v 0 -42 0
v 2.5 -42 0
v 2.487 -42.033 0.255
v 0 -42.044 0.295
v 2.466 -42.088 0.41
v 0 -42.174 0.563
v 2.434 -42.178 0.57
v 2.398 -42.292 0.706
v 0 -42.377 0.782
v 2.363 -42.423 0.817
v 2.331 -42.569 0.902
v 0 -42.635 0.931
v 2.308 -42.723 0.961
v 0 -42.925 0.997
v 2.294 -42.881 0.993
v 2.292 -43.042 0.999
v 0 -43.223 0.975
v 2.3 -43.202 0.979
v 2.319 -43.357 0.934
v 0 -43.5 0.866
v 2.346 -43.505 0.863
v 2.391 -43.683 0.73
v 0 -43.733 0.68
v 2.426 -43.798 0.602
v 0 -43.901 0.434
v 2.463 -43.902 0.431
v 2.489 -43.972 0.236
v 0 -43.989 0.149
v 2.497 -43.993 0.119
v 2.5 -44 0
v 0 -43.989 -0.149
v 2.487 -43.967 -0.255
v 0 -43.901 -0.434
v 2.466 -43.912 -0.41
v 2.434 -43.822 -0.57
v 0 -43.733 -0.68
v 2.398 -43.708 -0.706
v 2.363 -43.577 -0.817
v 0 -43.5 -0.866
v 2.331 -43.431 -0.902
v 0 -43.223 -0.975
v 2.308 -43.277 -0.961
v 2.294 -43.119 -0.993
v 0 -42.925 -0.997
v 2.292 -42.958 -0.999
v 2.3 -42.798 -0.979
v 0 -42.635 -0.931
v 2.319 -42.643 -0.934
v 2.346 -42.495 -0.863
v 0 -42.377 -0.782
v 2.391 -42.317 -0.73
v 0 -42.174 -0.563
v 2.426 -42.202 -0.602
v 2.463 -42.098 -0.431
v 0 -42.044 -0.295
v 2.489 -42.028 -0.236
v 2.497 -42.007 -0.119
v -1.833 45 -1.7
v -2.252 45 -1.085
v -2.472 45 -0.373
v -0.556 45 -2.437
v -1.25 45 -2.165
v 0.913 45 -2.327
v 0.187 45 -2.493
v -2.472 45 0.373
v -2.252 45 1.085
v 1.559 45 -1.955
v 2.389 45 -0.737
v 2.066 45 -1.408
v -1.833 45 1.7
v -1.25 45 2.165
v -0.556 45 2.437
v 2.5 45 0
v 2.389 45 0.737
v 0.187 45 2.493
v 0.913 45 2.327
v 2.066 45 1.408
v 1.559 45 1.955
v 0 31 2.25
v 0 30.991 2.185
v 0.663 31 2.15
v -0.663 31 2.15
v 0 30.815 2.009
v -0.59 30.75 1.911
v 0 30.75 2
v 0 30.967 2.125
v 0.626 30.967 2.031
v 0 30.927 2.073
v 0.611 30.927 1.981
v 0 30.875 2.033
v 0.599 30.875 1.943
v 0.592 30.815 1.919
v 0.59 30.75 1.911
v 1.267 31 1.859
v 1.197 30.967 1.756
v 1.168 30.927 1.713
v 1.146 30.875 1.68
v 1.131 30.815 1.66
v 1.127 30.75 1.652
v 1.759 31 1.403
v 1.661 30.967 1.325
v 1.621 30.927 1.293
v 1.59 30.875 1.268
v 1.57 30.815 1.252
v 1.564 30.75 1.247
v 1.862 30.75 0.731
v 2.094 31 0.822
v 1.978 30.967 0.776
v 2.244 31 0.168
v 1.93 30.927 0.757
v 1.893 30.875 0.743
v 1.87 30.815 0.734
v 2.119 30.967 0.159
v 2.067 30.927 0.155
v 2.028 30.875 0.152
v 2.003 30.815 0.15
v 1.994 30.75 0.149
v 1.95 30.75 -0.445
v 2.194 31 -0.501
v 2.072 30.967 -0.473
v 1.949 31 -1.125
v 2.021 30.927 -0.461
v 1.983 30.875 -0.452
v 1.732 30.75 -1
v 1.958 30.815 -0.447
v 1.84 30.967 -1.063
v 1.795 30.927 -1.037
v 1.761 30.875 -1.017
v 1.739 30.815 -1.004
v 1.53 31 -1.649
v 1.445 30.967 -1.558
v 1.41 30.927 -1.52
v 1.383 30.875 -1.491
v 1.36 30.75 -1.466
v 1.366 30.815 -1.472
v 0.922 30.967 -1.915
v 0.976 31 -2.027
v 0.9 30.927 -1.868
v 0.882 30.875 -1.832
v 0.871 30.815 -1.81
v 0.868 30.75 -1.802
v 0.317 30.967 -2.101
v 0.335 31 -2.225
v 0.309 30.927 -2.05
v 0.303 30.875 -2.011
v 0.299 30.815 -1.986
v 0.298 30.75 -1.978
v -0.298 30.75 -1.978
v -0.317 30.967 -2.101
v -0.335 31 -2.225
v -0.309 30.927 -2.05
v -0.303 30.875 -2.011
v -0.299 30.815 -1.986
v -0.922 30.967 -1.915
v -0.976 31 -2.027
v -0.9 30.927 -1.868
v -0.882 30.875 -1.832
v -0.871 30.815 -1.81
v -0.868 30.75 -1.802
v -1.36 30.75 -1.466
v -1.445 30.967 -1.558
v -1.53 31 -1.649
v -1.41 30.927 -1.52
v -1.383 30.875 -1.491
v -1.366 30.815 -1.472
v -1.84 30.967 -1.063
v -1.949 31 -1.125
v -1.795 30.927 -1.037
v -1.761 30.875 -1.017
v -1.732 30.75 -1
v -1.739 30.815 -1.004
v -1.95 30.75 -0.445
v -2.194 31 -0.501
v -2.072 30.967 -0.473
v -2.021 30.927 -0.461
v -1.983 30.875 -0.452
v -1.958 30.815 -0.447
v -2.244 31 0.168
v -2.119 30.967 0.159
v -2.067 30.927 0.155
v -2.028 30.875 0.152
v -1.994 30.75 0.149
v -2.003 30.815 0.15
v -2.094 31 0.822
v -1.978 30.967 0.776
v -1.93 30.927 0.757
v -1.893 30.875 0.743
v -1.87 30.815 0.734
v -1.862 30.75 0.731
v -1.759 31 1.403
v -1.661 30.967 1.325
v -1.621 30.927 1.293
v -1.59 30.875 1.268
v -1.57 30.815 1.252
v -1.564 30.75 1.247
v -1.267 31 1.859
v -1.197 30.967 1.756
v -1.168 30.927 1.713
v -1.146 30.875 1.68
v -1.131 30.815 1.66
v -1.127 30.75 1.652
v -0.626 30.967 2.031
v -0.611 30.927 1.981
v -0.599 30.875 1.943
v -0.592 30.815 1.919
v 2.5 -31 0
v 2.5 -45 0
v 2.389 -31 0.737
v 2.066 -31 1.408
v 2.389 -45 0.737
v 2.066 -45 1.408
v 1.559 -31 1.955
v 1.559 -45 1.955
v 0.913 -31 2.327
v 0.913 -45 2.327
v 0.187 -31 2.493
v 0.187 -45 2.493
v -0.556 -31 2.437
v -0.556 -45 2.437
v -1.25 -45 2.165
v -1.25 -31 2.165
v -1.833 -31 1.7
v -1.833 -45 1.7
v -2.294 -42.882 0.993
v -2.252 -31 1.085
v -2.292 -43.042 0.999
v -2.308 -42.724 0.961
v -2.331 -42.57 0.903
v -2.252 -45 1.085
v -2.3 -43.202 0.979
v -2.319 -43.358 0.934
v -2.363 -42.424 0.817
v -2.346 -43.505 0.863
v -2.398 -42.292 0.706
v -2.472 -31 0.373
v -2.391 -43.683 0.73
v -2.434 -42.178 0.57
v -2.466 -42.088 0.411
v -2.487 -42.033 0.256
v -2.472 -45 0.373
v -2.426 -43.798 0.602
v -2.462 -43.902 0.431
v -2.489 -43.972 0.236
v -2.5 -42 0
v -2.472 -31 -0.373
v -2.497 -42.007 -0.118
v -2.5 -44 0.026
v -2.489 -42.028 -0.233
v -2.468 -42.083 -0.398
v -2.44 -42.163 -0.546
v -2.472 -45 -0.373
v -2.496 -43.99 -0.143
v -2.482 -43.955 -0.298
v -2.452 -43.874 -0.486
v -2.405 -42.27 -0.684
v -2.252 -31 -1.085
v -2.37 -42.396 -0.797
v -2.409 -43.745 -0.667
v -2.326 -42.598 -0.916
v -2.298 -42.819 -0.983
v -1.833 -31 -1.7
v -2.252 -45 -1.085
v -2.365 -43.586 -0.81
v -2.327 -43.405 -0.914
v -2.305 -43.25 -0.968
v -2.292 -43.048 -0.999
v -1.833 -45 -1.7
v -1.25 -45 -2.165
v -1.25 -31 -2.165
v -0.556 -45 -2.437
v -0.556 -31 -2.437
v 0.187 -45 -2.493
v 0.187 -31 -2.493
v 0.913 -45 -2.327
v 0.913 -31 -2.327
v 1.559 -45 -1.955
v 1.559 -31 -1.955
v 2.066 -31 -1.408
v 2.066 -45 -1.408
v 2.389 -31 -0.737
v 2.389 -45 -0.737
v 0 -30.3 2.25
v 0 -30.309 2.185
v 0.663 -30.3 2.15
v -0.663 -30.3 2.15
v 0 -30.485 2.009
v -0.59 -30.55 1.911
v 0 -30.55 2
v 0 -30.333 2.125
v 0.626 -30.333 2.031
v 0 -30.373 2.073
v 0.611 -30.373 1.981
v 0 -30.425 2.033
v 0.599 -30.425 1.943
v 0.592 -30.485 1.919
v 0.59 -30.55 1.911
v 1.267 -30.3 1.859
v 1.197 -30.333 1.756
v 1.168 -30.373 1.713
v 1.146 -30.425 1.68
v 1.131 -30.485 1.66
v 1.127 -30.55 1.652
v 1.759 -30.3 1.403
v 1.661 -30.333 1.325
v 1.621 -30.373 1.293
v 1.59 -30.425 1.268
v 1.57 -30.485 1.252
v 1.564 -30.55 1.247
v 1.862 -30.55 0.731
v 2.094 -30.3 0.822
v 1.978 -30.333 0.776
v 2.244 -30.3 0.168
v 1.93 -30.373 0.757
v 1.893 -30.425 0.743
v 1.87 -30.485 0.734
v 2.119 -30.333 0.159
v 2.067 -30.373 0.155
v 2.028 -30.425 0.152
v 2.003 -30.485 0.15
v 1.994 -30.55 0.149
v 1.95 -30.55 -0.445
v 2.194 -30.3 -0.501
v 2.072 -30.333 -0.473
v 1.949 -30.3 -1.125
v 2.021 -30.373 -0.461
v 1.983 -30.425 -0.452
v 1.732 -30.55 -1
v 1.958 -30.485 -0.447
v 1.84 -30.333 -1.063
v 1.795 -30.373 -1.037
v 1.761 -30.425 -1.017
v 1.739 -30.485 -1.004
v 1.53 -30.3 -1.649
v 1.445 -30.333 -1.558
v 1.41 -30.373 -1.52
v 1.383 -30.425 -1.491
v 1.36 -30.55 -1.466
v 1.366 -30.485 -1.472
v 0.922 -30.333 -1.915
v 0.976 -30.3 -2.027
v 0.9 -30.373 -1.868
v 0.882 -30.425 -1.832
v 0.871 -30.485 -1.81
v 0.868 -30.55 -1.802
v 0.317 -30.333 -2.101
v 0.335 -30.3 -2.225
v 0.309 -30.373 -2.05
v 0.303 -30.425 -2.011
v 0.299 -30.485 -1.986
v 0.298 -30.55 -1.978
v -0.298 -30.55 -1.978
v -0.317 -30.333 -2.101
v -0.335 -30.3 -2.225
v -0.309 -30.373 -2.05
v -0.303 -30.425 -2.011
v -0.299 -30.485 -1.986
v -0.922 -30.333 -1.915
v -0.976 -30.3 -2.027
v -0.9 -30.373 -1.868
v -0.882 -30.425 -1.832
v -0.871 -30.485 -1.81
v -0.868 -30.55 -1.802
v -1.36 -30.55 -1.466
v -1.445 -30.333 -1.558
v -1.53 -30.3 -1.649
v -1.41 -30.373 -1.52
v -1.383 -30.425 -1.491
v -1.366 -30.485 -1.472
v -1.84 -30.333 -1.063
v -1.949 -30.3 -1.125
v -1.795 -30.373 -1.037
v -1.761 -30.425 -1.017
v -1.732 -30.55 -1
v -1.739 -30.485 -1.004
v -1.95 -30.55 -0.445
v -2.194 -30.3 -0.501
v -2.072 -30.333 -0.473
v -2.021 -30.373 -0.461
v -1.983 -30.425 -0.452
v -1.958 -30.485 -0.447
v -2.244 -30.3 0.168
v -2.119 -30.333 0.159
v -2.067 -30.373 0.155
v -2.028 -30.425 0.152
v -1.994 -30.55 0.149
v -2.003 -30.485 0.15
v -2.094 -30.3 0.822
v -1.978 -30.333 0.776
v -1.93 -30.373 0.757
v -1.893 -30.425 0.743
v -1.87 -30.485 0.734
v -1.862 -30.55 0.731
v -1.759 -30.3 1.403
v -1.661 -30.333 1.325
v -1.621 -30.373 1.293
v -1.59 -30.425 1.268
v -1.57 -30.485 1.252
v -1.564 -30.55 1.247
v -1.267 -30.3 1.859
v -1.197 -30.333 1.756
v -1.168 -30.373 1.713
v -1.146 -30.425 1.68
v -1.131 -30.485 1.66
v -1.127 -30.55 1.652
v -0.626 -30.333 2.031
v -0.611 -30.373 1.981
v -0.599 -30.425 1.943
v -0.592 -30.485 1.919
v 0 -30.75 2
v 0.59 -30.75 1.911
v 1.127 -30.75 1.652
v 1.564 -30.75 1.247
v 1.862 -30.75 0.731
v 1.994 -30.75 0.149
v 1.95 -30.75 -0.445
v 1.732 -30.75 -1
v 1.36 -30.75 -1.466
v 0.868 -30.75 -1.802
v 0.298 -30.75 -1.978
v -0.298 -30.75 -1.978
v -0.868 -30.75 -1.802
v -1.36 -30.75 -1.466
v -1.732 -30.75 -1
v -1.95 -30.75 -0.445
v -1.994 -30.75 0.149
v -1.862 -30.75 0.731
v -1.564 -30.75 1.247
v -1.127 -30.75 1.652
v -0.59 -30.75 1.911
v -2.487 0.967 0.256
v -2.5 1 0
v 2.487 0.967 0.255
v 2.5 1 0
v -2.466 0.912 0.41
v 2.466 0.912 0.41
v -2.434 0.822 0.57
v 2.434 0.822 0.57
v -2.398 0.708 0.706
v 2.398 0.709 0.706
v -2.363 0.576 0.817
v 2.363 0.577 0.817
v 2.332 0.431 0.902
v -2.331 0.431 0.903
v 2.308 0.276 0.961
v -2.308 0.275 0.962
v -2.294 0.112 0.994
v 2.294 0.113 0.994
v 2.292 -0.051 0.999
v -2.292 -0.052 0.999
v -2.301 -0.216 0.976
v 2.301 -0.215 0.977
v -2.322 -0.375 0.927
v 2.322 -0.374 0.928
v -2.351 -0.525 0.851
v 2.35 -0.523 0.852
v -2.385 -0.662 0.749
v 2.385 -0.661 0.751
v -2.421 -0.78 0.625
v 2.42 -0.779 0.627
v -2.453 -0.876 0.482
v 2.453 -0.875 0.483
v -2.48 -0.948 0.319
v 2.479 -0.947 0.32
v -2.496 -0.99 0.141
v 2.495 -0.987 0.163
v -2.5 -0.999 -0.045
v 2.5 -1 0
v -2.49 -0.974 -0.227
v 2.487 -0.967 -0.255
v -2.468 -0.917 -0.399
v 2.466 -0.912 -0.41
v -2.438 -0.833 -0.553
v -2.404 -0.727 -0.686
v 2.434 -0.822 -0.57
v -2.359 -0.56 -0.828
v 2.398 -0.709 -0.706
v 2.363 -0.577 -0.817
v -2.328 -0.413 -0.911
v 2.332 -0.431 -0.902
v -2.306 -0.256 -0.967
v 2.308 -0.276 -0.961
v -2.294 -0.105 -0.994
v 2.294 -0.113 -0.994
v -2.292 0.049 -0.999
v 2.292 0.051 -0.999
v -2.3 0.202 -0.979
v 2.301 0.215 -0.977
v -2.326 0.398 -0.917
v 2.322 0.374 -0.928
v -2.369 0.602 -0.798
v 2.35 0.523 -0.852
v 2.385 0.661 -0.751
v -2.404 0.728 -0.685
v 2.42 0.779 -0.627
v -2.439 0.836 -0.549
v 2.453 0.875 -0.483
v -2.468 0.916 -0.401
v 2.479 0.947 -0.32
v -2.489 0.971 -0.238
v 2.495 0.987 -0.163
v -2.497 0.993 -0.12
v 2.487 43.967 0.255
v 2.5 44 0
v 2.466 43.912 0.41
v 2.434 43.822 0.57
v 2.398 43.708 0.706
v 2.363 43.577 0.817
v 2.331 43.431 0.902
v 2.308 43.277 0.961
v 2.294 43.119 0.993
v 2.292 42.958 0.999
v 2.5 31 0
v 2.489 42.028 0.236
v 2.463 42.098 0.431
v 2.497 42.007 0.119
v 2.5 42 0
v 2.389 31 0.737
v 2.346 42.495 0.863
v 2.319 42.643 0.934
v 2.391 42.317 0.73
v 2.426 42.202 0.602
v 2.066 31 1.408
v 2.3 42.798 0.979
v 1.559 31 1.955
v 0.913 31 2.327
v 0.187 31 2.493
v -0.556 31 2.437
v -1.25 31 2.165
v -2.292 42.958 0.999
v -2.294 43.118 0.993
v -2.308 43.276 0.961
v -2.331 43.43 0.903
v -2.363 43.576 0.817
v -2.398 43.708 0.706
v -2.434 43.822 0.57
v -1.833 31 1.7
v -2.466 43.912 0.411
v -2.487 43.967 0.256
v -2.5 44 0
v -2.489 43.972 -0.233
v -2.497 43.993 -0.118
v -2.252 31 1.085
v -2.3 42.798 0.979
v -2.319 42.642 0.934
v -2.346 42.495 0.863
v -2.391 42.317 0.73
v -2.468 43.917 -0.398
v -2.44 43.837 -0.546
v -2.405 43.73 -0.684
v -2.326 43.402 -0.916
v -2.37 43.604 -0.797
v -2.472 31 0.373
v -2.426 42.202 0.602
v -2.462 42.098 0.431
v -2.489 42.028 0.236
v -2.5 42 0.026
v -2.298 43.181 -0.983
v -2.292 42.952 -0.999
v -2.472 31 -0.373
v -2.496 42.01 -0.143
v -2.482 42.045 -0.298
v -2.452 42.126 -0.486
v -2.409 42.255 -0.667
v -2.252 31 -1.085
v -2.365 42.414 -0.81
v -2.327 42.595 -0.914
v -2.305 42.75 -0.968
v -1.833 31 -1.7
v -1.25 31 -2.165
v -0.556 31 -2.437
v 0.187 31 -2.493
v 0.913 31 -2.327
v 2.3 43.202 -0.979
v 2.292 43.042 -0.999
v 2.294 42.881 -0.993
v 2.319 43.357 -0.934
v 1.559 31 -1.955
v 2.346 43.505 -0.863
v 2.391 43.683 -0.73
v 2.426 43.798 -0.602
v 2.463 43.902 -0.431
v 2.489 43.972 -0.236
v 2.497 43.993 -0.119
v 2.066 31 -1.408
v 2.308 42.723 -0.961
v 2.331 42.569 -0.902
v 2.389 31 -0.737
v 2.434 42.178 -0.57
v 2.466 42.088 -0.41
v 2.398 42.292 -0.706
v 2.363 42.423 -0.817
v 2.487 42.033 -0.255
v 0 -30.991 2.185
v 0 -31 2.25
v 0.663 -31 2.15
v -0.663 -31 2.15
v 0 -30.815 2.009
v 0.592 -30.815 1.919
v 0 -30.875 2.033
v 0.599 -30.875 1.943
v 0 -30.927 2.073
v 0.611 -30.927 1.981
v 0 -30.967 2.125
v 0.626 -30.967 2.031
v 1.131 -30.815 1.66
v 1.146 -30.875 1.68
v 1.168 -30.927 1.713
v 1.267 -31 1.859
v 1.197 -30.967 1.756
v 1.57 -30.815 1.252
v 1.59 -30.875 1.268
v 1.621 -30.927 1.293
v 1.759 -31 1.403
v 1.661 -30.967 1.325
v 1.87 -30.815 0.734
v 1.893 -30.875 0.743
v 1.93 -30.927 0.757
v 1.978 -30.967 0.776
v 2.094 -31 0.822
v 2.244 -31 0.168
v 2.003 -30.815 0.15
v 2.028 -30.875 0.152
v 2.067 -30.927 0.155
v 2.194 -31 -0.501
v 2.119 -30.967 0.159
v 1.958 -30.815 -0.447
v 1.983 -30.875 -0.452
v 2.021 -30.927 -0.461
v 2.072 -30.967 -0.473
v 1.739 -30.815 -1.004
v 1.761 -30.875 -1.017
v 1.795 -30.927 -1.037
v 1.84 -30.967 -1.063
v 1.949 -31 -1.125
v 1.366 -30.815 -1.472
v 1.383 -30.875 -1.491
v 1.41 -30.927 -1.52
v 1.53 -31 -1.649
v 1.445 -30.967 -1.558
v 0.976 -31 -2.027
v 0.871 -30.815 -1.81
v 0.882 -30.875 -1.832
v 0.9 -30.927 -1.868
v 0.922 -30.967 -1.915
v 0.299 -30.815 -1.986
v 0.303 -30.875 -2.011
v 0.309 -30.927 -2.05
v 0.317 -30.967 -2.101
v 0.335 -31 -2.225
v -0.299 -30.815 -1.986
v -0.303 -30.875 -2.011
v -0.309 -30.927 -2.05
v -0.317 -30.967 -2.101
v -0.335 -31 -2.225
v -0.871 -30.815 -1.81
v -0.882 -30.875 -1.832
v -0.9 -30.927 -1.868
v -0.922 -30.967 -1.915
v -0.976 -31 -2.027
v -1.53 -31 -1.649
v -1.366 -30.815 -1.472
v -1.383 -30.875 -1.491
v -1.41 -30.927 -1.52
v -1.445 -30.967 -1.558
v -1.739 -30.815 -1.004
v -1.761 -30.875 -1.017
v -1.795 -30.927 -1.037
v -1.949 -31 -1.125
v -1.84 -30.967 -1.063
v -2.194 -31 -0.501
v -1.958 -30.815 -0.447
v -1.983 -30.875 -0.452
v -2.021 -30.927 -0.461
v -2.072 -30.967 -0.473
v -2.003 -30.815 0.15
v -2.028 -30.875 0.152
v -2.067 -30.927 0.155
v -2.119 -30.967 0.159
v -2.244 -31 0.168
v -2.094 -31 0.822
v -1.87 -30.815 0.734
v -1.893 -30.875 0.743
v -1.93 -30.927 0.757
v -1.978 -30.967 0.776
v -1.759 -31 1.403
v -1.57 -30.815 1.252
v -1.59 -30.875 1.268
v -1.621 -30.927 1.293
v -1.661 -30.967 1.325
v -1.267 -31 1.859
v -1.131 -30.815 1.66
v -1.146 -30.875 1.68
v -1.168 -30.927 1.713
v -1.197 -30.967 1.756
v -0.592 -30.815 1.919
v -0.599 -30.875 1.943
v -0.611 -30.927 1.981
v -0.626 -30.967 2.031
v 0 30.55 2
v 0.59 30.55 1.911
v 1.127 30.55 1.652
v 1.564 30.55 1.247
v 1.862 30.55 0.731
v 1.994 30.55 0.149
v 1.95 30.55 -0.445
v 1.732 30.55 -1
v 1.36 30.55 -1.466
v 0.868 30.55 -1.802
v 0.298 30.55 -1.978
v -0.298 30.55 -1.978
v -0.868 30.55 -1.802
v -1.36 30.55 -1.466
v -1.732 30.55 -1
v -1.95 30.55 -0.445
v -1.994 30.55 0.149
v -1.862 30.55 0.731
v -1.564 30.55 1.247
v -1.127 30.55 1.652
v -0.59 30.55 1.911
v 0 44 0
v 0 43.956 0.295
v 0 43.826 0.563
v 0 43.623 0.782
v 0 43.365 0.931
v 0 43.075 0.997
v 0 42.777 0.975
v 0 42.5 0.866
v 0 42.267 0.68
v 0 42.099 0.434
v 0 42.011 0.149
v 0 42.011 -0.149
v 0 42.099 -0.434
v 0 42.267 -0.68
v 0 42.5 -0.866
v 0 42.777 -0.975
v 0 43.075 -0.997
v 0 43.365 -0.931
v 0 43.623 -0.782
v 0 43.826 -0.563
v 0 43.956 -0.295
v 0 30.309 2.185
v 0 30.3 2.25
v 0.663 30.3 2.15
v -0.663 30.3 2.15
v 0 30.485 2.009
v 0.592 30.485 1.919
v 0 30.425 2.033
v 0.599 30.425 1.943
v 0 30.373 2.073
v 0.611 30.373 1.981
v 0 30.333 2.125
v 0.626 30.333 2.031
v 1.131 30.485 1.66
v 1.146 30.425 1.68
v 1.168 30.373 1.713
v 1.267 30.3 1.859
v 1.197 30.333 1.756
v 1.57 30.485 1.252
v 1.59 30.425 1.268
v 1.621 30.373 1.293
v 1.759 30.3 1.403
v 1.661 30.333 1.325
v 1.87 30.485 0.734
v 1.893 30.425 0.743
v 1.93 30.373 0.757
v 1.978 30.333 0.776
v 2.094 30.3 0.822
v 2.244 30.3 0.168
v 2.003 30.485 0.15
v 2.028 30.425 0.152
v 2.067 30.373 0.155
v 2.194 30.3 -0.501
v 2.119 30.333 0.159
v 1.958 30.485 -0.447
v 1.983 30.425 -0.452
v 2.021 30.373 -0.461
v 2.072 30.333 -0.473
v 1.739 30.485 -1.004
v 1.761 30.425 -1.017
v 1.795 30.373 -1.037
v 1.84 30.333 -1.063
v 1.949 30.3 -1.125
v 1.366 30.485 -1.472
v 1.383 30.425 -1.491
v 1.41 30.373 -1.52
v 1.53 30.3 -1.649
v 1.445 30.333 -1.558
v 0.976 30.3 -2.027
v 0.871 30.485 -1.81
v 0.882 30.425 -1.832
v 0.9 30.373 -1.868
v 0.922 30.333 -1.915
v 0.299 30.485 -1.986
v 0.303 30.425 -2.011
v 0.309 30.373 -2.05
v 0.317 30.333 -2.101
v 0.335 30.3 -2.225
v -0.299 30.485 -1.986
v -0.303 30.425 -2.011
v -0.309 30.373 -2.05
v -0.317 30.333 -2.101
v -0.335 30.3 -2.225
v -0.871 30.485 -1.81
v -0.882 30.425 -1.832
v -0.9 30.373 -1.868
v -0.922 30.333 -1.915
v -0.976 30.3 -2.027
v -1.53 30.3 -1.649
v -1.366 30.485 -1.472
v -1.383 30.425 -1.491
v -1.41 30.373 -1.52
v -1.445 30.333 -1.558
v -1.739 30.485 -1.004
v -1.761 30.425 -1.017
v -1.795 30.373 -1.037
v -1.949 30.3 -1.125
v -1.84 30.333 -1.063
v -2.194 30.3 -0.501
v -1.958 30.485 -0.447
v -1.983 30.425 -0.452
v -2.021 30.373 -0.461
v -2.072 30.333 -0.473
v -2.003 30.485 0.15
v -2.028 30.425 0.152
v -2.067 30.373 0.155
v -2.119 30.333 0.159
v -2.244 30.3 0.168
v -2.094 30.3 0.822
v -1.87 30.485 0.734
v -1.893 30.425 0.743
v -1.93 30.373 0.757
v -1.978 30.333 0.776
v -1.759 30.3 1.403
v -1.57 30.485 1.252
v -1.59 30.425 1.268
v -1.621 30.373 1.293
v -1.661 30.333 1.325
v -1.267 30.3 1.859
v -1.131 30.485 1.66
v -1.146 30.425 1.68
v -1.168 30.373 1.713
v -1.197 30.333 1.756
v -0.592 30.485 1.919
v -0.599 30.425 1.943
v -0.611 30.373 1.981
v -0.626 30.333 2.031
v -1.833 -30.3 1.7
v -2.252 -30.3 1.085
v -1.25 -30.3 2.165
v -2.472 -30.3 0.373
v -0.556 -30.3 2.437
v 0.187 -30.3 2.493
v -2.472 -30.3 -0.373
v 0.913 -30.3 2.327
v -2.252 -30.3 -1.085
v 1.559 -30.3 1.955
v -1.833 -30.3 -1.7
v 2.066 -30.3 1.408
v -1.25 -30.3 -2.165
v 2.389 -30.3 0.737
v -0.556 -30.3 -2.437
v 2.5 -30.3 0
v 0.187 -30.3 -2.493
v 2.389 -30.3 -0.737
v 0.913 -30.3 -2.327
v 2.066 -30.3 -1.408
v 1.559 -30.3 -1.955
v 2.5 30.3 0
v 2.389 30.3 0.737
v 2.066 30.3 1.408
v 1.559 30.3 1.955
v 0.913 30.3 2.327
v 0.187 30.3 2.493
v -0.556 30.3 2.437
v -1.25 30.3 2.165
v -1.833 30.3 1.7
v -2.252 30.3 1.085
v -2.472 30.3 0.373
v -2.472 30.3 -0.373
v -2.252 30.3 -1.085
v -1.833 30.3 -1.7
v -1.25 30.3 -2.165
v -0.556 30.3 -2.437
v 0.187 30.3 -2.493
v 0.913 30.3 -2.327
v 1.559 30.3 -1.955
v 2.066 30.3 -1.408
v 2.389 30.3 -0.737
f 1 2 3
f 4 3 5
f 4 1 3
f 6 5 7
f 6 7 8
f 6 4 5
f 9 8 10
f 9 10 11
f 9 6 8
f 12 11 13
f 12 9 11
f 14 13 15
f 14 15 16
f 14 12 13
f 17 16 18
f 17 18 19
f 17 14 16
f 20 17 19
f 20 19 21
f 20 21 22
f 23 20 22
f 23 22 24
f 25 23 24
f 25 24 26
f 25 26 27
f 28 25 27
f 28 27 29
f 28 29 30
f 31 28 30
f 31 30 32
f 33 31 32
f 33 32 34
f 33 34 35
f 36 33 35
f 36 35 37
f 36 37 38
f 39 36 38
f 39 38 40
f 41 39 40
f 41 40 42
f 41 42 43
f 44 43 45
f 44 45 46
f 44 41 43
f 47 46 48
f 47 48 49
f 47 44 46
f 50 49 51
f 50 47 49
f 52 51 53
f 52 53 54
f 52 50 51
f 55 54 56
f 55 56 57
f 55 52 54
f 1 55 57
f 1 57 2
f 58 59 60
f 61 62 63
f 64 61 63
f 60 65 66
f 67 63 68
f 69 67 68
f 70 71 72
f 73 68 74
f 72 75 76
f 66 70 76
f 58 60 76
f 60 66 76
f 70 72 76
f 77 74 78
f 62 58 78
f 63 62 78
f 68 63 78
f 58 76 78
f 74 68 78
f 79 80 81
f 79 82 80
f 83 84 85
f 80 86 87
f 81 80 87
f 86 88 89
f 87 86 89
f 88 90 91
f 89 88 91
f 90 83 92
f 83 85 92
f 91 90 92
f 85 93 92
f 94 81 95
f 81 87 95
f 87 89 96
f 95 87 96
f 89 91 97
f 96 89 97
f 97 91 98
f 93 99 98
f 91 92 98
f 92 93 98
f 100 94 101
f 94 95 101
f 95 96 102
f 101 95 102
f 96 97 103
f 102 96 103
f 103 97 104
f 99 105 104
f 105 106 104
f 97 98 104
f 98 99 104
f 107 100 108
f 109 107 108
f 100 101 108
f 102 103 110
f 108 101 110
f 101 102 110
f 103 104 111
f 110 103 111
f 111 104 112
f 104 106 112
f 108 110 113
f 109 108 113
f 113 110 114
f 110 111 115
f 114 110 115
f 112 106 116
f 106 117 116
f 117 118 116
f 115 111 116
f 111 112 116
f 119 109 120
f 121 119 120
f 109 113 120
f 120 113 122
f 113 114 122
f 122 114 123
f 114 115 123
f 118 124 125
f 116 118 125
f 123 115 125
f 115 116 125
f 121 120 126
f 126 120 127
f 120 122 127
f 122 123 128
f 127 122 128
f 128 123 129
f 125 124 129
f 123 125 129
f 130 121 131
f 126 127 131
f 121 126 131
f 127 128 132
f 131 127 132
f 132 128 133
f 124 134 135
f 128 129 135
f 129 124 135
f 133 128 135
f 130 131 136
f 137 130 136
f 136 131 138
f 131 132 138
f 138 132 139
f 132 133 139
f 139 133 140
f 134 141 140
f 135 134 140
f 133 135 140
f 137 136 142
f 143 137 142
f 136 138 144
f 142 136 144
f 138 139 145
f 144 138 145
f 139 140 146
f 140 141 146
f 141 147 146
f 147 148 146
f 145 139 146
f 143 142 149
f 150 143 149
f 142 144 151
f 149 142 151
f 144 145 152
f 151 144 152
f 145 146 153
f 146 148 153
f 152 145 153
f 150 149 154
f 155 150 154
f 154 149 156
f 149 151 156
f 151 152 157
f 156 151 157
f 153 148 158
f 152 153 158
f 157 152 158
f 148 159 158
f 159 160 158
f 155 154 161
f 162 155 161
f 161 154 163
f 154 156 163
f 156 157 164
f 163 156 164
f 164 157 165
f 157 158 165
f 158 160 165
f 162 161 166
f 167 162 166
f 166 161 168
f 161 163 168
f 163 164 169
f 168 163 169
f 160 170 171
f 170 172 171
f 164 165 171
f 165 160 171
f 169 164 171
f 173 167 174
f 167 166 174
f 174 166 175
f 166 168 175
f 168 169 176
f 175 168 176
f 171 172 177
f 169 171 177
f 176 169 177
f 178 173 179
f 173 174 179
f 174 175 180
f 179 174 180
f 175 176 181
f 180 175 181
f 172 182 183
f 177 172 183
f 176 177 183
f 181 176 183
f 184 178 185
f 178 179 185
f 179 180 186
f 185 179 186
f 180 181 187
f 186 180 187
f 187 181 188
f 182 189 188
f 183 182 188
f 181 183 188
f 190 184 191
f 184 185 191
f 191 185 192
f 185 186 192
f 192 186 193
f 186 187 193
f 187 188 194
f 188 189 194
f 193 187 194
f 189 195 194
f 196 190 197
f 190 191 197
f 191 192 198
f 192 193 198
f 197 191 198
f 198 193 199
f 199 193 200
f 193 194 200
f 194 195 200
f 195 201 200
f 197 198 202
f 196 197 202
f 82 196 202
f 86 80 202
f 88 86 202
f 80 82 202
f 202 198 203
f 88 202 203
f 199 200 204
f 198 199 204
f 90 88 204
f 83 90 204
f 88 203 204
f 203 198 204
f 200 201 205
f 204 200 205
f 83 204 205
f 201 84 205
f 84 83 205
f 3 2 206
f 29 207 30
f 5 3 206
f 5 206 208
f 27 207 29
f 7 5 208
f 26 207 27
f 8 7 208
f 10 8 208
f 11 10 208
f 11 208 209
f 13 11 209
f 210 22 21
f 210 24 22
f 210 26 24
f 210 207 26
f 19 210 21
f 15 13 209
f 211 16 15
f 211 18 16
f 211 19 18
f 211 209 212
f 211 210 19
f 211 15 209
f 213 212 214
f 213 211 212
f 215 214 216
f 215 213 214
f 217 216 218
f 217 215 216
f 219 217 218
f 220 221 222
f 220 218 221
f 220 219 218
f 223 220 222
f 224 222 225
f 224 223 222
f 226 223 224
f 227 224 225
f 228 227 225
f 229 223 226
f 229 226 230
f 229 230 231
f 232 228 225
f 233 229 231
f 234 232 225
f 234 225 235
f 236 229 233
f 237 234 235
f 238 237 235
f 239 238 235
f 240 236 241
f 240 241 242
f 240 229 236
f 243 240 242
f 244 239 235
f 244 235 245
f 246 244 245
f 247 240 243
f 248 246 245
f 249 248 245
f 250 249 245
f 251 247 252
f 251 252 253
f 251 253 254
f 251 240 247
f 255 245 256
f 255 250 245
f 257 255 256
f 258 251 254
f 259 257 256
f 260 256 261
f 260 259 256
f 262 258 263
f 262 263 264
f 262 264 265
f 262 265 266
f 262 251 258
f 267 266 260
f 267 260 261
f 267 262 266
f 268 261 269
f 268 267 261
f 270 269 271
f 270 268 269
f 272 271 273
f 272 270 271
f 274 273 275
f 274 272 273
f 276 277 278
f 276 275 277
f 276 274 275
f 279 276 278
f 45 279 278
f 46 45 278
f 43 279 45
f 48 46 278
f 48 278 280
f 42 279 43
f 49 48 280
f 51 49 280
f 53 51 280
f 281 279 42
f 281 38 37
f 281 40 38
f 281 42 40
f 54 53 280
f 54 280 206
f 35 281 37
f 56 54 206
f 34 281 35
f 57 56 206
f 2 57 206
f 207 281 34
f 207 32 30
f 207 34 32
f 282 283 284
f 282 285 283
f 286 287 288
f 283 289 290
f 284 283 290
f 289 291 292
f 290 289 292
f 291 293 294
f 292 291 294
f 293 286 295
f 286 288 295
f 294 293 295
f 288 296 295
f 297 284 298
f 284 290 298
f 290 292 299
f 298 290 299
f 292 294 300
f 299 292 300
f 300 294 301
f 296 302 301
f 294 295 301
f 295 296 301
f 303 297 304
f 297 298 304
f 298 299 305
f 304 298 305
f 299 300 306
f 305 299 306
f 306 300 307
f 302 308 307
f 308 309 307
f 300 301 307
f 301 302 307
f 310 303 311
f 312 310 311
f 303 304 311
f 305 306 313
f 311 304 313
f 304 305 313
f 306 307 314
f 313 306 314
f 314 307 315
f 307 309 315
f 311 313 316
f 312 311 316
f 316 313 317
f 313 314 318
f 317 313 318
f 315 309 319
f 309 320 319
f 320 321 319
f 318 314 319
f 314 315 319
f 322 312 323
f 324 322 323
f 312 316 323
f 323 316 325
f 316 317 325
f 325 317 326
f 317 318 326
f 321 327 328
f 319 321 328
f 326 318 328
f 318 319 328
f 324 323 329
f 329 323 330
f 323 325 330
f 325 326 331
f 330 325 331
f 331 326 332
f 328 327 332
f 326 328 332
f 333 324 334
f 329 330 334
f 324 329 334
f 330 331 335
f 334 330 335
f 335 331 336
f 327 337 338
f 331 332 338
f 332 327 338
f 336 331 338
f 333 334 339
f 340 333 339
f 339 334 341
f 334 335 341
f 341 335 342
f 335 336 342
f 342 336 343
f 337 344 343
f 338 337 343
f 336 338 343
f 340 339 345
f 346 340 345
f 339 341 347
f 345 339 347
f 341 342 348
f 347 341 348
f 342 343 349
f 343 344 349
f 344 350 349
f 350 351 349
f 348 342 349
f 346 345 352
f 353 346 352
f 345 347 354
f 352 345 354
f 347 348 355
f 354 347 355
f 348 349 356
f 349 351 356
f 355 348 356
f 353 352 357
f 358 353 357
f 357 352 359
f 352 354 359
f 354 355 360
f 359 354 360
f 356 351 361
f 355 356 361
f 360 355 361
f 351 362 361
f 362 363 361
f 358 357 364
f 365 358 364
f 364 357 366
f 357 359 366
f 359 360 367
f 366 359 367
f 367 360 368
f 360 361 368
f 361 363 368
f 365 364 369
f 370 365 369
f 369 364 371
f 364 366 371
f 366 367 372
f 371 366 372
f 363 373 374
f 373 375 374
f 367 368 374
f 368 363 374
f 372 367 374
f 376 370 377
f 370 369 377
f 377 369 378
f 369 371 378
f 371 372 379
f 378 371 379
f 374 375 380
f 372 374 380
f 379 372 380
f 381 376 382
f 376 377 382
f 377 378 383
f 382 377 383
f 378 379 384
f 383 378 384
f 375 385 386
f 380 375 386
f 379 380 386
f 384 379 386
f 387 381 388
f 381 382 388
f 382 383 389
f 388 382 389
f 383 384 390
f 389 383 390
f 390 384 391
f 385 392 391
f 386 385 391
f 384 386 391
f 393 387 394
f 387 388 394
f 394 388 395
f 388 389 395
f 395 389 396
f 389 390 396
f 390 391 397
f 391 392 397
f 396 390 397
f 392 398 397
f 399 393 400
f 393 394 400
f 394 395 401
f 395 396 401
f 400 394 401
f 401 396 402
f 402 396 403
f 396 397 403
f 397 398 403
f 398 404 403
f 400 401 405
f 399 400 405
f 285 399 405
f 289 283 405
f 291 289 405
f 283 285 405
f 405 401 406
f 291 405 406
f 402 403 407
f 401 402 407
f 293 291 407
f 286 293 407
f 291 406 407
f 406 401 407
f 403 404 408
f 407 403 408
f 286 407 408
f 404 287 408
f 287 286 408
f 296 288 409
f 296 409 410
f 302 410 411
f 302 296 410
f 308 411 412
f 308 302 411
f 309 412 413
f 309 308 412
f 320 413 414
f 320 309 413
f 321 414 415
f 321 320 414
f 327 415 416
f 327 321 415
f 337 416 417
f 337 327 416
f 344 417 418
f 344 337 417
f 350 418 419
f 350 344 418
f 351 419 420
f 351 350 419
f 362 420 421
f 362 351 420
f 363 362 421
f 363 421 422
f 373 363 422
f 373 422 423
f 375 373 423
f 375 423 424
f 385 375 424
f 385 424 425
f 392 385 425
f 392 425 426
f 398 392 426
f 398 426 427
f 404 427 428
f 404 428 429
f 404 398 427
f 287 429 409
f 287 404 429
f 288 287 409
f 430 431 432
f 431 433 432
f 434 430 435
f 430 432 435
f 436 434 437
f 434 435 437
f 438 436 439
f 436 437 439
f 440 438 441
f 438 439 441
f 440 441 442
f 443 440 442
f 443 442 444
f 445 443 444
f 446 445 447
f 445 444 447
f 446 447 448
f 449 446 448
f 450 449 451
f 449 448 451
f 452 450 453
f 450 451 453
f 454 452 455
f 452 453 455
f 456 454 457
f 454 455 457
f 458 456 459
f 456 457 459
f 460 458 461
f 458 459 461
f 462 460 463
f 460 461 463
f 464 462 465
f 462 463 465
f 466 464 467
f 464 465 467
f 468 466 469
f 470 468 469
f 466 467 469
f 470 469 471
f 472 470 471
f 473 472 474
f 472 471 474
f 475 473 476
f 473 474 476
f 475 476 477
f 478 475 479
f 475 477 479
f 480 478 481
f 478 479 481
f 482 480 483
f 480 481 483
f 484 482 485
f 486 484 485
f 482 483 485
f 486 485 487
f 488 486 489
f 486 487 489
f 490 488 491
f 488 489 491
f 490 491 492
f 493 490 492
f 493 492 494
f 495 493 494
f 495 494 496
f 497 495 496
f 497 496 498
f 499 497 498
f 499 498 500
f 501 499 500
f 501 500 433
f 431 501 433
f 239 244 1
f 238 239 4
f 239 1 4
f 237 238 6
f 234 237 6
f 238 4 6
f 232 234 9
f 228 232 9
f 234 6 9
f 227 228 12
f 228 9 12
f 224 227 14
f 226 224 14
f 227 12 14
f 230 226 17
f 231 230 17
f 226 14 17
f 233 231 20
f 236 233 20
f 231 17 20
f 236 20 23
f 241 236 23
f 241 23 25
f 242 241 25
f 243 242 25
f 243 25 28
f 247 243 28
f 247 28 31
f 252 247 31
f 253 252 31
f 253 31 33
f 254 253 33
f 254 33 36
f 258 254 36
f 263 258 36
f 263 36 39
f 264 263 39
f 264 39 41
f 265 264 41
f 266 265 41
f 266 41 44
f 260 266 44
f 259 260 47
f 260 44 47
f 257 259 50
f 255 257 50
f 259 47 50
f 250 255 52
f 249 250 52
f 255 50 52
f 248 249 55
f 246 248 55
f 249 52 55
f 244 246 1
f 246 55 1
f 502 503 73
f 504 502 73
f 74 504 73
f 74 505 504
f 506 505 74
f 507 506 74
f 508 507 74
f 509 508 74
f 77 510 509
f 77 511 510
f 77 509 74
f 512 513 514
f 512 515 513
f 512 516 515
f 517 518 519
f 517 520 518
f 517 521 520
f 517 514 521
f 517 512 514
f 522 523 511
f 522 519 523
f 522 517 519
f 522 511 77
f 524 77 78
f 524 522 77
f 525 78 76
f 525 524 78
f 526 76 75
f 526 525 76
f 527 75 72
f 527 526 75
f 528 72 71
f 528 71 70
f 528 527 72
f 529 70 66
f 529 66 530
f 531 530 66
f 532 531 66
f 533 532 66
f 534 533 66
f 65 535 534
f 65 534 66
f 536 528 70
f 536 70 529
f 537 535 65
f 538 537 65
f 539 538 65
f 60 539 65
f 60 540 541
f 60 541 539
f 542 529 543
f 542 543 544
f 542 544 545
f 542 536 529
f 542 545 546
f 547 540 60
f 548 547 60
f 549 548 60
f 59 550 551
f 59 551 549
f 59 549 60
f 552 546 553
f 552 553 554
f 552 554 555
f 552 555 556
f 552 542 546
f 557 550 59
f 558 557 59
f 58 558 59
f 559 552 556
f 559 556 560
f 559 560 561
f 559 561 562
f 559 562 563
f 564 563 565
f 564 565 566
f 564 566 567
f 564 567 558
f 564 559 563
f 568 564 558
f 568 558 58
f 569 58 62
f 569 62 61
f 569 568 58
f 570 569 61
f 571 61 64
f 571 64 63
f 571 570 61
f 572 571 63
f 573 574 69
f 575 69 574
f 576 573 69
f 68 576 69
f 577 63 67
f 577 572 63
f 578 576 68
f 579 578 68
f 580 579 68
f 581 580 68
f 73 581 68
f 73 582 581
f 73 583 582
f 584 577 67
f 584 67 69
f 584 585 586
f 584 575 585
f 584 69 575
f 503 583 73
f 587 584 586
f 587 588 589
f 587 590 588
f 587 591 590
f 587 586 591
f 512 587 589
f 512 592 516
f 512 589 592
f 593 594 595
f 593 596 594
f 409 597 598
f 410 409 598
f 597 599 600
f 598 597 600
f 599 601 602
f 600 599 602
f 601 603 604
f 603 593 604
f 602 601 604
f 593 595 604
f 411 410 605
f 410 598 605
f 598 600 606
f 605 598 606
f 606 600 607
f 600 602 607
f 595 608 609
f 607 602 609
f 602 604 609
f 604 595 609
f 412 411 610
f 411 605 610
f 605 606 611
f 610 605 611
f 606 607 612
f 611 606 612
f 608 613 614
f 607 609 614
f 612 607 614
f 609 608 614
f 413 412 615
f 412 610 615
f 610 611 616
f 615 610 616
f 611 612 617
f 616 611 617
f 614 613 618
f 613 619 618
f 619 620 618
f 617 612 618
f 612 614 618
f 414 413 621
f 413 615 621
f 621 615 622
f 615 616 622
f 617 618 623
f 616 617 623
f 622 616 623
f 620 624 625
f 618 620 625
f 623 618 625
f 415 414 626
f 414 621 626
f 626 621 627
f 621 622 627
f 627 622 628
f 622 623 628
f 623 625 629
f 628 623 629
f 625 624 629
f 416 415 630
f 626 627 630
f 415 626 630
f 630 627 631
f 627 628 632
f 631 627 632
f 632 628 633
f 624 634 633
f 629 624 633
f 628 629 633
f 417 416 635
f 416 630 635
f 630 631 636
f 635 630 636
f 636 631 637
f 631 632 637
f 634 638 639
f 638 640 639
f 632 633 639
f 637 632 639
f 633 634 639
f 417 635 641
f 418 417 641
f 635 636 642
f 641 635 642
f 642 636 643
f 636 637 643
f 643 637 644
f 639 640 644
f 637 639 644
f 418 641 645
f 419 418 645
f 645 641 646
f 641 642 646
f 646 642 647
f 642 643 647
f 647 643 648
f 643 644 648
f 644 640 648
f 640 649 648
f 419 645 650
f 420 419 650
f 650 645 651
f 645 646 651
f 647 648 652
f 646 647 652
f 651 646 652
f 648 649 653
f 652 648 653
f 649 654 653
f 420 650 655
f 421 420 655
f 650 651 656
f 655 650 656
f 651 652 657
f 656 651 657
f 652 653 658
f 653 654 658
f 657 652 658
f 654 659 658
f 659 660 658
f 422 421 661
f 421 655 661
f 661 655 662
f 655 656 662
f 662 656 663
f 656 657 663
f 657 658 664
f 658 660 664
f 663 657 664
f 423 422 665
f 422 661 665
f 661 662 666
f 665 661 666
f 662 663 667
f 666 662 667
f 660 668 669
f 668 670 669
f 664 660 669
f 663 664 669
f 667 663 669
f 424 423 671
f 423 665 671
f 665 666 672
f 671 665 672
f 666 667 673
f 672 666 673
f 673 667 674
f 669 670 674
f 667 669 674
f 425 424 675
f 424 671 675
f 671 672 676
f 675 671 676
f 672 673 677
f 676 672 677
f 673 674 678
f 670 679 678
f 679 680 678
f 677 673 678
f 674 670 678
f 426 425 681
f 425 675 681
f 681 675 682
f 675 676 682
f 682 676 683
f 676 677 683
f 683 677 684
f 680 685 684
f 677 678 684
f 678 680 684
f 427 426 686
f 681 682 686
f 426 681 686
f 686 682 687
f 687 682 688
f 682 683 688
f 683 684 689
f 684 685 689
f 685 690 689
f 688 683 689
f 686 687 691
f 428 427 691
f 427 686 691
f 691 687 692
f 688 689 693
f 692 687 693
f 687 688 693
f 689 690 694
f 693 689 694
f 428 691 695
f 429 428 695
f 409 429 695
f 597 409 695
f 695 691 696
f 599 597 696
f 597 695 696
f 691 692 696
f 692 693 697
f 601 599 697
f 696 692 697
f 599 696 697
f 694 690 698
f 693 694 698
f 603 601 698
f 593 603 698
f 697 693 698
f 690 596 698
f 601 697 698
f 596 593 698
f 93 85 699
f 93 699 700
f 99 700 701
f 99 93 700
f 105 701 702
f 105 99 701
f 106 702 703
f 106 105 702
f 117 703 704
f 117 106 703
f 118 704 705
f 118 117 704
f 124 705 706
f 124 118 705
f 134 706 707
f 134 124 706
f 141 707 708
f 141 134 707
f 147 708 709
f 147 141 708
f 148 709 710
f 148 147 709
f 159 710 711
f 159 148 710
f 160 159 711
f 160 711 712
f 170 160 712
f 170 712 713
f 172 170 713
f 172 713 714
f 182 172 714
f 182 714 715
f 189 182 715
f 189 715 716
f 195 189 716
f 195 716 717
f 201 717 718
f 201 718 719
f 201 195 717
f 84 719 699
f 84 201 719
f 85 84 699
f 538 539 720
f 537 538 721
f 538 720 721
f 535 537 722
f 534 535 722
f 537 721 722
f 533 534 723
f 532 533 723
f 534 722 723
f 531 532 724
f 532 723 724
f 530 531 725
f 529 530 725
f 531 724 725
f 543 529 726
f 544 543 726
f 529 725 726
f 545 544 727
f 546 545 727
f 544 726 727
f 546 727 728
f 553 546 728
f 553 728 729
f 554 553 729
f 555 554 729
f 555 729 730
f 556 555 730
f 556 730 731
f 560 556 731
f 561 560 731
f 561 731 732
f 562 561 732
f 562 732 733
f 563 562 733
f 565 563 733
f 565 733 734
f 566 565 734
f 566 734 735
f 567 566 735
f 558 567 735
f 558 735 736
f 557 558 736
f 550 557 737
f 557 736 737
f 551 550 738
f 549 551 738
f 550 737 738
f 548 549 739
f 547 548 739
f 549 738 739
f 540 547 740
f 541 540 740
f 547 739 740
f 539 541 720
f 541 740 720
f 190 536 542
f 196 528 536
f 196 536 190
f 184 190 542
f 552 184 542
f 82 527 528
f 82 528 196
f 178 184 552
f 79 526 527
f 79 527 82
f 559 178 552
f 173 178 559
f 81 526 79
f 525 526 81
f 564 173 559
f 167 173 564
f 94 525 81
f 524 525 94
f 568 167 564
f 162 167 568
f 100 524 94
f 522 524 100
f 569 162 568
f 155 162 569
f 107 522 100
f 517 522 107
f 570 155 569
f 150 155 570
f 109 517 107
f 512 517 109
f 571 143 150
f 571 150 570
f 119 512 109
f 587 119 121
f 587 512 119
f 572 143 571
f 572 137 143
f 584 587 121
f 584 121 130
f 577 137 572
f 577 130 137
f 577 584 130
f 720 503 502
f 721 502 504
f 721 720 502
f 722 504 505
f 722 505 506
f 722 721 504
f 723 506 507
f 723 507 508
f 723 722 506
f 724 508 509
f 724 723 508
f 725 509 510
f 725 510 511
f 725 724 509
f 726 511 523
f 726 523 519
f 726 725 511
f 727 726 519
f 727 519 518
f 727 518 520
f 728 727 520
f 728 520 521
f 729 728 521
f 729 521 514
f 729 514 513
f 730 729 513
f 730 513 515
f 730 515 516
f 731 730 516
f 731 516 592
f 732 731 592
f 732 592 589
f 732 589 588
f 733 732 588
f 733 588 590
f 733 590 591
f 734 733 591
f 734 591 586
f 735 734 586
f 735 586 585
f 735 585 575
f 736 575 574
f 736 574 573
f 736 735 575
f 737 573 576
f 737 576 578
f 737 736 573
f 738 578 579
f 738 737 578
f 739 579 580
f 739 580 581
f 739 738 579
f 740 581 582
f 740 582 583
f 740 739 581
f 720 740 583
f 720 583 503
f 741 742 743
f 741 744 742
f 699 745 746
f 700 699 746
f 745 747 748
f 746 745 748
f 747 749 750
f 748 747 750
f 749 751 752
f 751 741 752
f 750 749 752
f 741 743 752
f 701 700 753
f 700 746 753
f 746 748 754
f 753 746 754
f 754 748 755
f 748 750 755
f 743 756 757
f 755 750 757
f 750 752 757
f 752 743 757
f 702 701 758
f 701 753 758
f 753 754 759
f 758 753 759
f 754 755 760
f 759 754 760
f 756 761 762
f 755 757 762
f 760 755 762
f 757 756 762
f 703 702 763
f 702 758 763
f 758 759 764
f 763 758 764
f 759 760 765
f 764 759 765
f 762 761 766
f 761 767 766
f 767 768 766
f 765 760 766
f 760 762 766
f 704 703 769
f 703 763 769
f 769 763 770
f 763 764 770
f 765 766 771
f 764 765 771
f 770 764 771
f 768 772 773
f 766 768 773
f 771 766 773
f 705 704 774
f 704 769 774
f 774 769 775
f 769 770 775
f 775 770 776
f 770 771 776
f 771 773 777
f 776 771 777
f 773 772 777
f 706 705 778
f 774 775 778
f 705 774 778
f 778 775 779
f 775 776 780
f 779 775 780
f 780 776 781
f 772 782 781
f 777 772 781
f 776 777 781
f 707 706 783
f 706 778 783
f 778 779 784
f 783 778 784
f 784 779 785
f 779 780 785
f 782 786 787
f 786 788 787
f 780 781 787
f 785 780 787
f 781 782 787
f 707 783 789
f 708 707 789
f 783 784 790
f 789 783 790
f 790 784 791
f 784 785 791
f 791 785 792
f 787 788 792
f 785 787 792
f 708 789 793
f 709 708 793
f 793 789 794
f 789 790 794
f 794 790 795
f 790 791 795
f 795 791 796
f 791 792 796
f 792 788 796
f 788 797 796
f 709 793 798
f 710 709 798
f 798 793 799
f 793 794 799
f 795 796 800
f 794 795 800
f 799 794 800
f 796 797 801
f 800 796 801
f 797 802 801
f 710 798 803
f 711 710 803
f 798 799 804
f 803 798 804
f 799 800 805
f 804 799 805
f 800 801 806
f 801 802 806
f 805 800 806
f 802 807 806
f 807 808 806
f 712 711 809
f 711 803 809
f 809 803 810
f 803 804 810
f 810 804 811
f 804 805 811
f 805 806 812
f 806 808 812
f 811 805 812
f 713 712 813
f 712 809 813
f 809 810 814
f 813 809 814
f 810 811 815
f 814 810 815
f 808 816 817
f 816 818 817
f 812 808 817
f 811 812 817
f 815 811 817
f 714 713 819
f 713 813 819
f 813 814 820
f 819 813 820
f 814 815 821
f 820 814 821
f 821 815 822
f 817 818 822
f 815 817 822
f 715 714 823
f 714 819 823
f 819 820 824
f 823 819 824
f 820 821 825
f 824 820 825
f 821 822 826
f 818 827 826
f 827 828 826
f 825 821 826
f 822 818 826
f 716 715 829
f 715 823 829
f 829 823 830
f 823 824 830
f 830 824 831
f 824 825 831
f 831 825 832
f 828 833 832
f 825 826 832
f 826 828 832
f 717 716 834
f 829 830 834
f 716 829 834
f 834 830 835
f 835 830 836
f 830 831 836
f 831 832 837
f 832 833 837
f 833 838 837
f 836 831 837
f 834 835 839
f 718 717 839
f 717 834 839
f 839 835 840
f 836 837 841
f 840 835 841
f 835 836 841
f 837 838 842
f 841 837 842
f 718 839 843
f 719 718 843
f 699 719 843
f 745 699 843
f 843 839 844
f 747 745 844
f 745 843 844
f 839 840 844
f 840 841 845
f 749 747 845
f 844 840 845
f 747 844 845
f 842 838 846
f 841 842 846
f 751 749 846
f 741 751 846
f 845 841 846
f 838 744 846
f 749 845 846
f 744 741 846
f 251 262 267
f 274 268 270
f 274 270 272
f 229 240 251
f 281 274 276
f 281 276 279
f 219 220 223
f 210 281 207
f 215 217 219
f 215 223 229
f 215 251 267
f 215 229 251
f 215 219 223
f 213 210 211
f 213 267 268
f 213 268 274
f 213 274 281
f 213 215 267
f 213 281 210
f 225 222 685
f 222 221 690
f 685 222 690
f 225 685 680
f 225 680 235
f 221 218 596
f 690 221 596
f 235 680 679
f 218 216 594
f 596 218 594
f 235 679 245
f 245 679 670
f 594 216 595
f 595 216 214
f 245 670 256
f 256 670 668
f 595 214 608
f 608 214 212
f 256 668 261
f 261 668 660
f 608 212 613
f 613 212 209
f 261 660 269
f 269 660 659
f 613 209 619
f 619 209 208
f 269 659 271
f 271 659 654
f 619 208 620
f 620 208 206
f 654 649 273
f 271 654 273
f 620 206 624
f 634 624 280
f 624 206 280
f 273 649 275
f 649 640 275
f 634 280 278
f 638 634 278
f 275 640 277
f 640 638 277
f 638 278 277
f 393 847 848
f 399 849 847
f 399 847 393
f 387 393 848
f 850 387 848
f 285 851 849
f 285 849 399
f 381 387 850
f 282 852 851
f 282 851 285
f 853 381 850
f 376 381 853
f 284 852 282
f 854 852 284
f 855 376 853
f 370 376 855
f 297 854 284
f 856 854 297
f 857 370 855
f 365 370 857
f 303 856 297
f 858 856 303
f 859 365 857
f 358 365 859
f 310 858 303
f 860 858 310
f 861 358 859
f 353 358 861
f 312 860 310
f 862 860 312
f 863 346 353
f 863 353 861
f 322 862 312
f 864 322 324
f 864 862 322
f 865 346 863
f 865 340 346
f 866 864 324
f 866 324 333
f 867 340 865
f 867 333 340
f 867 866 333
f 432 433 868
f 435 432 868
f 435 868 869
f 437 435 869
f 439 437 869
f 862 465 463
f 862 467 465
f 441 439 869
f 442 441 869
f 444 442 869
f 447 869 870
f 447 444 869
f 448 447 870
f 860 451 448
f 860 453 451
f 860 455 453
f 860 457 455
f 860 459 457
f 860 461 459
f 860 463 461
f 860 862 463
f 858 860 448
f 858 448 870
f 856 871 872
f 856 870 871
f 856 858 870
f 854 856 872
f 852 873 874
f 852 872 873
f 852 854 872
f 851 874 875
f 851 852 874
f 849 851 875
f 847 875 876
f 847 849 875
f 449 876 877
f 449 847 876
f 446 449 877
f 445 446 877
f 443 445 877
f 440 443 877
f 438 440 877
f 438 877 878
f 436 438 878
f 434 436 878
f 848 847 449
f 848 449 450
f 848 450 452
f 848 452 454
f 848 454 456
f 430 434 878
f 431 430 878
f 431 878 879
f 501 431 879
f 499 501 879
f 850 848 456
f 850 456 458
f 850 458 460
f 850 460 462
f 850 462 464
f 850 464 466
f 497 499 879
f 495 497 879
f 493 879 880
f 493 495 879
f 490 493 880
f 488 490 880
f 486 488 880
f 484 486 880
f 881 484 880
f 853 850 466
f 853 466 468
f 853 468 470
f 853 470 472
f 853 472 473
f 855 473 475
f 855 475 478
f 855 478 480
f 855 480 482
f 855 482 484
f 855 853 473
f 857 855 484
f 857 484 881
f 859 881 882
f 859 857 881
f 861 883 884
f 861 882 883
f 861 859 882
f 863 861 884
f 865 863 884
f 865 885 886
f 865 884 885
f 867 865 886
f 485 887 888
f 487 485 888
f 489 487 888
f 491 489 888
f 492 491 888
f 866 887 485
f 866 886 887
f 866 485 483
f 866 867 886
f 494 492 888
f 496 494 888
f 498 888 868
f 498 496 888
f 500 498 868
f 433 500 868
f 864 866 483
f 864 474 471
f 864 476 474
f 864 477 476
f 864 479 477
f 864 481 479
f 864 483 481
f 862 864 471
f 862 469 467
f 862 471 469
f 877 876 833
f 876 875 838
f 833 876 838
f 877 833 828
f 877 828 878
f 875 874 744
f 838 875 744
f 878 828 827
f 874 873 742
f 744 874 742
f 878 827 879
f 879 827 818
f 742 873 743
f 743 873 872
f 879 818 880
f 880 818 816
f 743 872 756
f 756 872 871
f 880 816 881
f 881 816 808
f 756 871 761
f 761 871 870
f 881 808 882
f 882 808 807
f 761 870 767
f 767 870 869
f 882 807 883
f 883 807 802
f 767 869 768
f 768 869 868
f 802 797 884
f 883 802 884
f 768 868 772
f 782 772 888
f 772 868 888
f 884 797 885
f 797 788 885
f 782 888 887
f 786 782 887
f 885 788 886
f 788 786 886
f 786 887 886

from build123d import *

# Parameters (mm, degrees)
F0_R     = 2.5
F1_DEPTH = 45
F2_W     = 0.7
F2_H     = 0.5
F5_R     = 1
F6_DEPTH = 12.5
F7_R     = 0.25


with BuildPart() as f1:
    # F0 (on Front) → F1 (new body, symmetric)
    with BuildSketch(Plane.XZ):
        Circle(F0_R)
    extrude(amount=F1_DEPTH, both=True)

    # F2 (on Right) → F4 (revolve, cut)
    with BuildSketch(Plane.YZ):
        with Locations((-30.65, 2.25)):
            Rectangle(F2_W, F2_H)
        with Locations((30.65, 2.25)):
            Rectangle(F2_W, F2_H)
    revolve(axis=Axis((0, -3.298404, 0), (0, 1, 0)), mode=Mode.SUBTRACT)

    # F5 (on Right) → F6 (cut, symmetric)
    with BuildSketch(Plane.YZ):
        with Locations((-43, 0)):
            Circle(F5_R)
        with Locations((43, 0)):
            Circle(F5_R)
        Circle(F5_R)
    extrude(amount=F6_DEPTH, both=True, mode=Mode.SUBTRACT)

    # F7
    f7_edges = [f1.edges().sort_by_distance(p)[0] for p in [
        (0, -31, -2),
        (0, -30.3, -2),
        (0, 30.3, -2),
        (0, 31, -2),
    ]]
    fillet(f7_edges, radius=F7_R)


solid = f1.part
